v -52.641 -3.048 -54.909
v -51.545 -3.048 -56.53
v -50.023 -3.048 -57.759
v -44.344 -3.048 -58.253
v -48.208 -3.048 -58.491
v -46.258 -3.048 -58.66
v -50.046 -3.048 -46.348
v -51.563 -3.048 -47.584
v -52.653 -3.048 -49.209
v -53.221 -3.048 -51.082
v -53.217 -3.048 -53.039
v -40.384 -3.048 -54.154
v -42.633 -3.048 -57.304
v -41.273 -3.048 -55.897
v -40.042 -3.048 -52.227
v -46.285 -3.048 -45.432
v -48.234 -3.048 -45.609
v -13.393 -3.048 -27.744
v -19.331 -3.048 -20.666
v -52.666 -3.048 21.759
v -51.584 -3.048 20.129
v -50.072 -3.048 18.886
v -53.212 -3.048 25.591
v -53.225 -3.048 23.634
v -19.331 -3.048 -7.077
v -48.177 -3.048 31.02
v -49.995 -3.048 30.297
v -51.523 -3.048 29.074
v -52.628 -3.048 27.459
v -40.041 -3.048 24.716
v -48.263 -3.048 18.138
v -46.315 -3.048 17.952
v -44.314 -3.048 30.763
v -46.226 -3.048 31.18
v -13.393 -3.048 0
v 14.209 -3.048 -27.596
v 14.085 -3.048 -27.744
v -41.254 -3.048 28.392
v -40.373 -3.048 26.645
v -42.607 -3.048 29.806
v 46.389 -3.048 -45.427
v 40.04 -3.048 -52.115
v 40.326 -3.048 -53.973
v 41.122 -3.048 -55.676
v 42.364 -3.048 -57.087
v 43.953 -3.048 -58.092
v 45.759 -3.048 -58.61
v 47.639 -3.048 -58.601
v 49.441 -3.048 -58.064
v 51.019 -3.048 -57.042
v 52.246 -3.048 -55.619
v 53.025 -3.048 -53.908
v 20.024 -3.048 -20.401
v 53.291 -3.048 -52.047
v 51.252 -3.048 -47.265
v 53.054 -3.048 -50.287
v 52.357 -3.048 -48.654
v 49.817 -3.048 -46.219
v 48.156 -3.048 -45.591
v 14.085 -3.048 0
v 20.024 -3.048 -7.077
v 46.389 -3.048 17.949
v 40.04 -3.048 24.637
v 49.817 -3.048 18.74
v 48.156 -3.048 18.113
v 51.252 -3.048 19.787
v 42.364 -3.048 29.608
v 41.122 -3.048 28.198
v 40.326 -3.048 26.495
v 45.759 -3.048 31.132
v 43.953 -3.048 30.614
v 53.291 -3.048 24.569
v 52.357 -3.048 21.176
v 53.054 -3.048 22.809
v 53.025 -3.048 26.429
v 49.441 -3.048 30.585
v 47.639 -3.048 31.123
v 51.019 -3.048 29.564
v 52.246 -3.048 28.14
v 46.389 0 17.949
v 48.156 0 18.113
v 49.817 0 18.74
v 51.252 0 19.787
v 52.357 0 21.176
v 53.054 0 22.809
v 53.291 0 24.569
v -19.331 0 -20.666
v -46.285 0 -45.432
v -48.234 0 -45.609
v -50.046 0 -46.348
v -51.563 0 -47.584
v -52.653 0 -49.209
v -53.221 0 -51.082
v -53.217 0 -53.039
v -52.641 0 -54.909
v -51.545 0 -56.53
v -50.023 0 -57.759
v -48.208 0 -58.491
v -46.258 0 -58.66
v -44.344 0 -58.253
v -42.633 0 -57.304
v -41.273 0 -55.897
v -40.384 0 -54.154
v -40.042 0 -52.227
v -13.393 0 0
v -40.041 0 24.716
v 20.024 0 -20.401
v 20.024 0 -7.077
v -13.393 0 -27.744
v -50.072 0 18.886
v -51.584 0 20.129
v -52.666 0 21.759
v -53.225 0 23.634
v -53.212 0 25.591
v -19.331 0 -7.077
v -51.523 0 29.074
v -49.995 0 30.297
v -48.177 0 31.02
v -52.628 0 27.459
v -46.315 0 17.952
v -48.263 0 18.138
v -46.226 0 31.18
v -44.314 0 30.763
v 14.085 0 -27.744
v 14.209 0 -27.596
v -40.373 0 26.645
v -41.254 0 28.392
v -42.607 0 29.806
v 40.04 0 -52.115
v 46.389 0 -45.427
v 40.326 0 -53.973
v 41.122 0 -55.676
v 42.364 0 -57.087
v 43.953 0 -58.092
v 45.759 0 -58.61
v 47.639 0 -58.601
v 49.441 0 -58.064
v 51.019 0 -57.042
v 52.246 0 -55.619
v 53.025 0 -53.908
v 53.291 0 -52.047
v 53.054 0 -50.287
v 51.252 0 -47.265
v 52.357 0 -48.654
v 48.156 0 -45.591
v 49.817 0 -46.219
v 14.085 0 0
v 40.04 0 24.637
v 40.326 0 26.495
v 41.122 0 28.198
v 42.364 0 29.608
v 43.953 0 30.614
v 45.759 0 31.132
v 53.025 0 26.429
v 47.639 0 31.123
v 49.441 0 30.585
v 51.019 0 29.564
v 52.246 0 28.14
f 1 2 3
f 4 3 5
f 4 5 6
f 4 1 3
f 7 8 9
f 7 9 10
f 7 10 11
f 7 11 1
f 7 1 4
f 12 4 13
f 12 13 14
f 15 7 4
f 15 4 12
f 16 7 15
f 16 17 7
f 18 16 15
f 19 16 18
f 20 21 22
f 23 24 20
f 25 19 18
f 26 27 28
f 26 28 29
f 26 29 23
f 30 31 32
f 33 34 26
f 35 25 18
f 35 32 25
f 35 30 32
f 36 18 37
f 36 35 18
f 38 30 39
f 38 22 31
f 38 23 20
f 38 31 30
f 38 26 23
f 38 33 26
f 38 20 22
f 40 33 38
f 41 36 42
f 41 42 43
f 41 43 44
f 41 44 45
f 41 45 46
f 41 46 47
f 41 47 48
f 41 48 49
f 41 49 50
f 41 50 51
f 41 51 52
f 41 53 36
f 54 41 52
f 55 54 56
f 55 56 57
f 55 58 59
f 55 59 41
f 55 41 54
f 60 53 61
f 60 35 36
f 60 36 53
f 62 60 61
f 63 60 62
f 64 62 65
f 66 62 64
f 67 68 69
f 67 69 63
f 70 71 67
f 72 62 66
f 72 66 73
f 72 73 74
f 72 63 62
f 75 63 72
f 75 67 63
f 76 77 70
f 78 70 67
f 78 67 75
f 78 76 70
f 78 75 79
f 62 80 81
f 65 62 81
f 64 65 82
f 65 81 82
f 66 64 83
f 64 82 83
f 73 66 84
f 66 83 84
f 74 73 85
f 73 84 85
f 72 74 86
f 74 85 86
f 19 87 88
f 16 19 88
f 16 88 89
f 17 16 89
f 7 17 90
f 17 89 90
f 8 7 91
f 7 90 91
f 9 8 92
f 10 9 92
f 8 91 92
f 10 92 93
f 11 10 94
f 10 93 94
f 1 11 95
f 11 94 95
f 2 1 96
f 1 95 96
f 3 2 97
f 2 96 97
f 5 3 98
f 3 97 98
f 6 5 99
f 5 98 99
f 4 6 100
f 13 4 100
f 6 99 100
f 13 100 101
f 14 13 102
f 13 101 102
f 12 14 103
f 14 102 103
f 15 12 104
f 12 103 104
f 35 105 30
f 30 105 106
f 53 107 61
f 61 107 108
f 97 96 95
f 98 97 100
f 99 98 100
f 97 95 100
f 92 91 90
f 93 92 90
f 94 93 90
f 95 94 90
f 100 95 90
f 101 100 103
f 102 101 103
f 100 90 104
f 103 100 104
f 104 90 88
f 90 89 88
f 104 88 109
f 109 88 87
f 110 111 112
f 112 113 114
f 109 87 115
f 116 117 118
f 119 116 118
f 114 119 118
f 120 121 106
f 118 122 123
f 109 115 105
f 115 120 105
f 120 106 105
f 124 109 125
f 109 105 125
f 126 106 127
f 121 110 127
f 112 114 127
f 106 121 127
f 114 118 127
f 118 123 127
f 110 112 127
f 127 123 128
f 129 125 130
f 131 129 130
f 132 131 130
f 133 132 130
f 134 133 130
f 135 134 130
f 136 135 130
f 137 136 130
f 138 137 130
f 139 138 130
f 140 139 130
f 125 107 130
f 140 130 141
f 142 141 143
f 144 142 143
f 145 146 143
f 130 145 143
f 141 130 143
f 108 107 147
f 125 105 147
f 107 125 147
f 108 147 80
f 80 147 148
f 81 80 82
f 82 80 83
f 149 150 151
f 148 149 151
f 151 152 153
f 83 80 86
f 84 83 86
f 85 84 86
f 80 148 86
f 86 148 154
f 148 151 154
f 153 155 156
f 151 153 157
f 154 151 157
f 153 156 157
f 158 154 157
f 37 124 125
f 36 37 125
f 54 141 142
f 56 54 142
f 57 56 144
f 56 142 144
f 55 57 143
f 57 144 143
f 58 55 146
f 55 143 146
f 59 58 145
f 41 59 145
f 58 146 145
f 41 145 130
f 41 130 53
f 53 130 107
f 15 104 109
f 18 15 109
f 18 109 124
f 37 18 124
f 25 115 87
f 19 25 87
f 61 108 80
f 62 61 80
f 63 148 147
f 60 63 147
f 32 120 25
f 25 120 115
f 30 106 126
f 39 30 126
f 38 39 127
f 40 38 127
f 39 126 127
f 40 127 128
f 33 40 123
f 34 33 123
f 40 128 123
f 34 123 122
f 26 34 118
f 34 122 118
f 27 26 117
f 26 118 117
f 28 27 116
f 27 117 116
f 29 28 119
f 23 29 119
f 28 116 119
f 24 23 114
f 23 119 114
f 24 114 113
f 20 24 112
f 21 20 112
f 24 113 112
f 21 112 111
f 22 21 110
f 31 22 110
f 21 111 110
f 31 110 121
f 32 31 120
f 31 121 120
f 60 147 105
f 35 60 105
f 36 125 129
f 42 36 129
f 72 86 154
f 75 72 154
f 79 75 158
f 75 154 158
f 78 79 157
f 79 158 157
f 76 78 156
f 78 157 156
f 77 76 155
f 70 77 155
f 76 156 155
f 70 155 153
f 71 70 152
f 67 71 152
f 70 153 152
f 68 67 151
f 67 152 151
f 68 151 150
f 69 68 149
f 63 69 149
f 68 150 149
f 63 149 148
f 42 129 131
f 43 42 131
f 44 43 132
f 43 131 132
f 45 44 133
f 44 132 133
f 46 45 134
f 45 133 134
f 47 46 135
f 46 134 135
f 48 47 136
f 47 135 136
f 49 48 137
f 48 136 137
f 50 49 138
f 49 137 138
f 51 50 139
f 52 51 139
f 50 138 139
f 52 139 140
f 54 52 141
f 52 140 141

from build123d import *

# Parameters (mm, degrees)
F1_DEPTH = 3.048


with BuildPart() as f1:
    # F0 (on Front) → F1 (new body)
    with BuildSketch(Plane.XZ):
        with BuildLine():
            ThreePointArc((-40.039819, 24.568676), (-40.04023, 24.642439), (-40.041462, 24.716192))
            ThreePointArc((-40.041462, 24.716192), (-51.523489, 29.074453), (-46.315227, 17.95216))
            ThreePointArc((-46.315227, 17.95216), (-41.858186, 20.009098), (-40.039819, 24.568676))
        make_face()
        with BuildLine():
            Line((-19.331162, -7.077152), (-13.392727, 0))
            Line((-13.392727, 0), (-40.041462, 24.716192))
            ThreePointArc((-40.041462, 24.716192), (-40.04023, 24.642439), (-40.039819, 24.568676))
            ThreePointArc((-40.039819, 24.568676), (-41.858186, 20.009098), (-46.315227, 17.95216))
            Line((-46.315227, 17.95216), (-19.331162, -7.077152))
        make_face()
        Polygon((14.085453, 0), (-13.392727, 0), (-19.331162, -7.077152), (-19.331162, -20.666365), (-13.392727, -27.743516), (14.085453, -27.743516), (14.209385, -27.59582), (20.023889, -20.666365), (20.023889, -20.401029), (20.023889, -7.077152), align=None)
        with BuildLine():
            Line((40.040169, 24.6367), (14.085453, 0))
            Line((14.085453, 0), (20.023889, -7.077152))
            Line((20.023889, -7.077152), (46.388558, 17.948684))
            ThreePointArc((46.388558, 17.948684), (41.86004, 20.007143), (40.040169, 24.6367))
        make_face()
        with BuildLine():
            ThreePointArc((53.291393, 24.568676), (46.699619, 31.194376), (40.040169, 24.6367))
            ThreePointArc((40.040169, 24.6367), (41.86004, 20.007143), (46.388558, 17.948684))
            ThreePointArc((46.388558, 17.948684), (51.251748, 19.786589), (53.291393, 24.568676))
        make_face()
        with BuildLine():
            Line((46.388558, -45.426865), (20.023889, -20.401029))
            Line((20.023889, -20.401029), (20.023889, -20.666365))
            Line((20.023889, -20.666365), (14.209385, -27.59582))
            Line((14.209385, -27.59582), (40.040169, -52.114881))
            ThreePointArc((40.040169, -52.114881), (41.86004, -47.485324), (46.388558, -45.426865))
        make_face()
        with BuildLine():
            ThreePointArc((53.291393, -52.046857), (51.251748, -47.26477), (46.388558, -45.426865))
            ThreePointArc((46.388558, -45.426865), (41.86004, -47.485324), (40.040169, -52.114881))
            ThreePointArc((40.040169, -52.114881), (46.699619, -58.672556), (53.291393, -52.046857))
        make_face()
        with BuildLine():
            Line((-13.392727, -27.743516), (-19.331162, -20.666365))
            Line((-19.331162, -20.666365), (-46.284951, -45.432014))
            ThreePointArc((-46.284951, -45.432014), (-41.847765, -47.498291), (-40.039819, -52.046857))
            ThreePointArc((-40.039819, -52.046857), (-40.04043, -52.13678), (-40.04226, -52.226687))
            Line((-40.04226, -52.226687), (-13.392727, -27.743516))
        make_face()
        with BuildLine():
            ThreePointArc((-40.039819, -52.046857), (-41.847765, -47.498291), (-46.284951, -45.432014))
            ThreePointArc((-46.284951, -45.432014), (-51.544735, -56.529618), (-40.04226, -52.226687))
            ThreePointArc((-40.04226, -52.226687), (-40.04043, -52.13678), (-40.039819, -52.046857))
        make_face()
    extrude(amount=F1_DEPTH)


solid = f1.part
